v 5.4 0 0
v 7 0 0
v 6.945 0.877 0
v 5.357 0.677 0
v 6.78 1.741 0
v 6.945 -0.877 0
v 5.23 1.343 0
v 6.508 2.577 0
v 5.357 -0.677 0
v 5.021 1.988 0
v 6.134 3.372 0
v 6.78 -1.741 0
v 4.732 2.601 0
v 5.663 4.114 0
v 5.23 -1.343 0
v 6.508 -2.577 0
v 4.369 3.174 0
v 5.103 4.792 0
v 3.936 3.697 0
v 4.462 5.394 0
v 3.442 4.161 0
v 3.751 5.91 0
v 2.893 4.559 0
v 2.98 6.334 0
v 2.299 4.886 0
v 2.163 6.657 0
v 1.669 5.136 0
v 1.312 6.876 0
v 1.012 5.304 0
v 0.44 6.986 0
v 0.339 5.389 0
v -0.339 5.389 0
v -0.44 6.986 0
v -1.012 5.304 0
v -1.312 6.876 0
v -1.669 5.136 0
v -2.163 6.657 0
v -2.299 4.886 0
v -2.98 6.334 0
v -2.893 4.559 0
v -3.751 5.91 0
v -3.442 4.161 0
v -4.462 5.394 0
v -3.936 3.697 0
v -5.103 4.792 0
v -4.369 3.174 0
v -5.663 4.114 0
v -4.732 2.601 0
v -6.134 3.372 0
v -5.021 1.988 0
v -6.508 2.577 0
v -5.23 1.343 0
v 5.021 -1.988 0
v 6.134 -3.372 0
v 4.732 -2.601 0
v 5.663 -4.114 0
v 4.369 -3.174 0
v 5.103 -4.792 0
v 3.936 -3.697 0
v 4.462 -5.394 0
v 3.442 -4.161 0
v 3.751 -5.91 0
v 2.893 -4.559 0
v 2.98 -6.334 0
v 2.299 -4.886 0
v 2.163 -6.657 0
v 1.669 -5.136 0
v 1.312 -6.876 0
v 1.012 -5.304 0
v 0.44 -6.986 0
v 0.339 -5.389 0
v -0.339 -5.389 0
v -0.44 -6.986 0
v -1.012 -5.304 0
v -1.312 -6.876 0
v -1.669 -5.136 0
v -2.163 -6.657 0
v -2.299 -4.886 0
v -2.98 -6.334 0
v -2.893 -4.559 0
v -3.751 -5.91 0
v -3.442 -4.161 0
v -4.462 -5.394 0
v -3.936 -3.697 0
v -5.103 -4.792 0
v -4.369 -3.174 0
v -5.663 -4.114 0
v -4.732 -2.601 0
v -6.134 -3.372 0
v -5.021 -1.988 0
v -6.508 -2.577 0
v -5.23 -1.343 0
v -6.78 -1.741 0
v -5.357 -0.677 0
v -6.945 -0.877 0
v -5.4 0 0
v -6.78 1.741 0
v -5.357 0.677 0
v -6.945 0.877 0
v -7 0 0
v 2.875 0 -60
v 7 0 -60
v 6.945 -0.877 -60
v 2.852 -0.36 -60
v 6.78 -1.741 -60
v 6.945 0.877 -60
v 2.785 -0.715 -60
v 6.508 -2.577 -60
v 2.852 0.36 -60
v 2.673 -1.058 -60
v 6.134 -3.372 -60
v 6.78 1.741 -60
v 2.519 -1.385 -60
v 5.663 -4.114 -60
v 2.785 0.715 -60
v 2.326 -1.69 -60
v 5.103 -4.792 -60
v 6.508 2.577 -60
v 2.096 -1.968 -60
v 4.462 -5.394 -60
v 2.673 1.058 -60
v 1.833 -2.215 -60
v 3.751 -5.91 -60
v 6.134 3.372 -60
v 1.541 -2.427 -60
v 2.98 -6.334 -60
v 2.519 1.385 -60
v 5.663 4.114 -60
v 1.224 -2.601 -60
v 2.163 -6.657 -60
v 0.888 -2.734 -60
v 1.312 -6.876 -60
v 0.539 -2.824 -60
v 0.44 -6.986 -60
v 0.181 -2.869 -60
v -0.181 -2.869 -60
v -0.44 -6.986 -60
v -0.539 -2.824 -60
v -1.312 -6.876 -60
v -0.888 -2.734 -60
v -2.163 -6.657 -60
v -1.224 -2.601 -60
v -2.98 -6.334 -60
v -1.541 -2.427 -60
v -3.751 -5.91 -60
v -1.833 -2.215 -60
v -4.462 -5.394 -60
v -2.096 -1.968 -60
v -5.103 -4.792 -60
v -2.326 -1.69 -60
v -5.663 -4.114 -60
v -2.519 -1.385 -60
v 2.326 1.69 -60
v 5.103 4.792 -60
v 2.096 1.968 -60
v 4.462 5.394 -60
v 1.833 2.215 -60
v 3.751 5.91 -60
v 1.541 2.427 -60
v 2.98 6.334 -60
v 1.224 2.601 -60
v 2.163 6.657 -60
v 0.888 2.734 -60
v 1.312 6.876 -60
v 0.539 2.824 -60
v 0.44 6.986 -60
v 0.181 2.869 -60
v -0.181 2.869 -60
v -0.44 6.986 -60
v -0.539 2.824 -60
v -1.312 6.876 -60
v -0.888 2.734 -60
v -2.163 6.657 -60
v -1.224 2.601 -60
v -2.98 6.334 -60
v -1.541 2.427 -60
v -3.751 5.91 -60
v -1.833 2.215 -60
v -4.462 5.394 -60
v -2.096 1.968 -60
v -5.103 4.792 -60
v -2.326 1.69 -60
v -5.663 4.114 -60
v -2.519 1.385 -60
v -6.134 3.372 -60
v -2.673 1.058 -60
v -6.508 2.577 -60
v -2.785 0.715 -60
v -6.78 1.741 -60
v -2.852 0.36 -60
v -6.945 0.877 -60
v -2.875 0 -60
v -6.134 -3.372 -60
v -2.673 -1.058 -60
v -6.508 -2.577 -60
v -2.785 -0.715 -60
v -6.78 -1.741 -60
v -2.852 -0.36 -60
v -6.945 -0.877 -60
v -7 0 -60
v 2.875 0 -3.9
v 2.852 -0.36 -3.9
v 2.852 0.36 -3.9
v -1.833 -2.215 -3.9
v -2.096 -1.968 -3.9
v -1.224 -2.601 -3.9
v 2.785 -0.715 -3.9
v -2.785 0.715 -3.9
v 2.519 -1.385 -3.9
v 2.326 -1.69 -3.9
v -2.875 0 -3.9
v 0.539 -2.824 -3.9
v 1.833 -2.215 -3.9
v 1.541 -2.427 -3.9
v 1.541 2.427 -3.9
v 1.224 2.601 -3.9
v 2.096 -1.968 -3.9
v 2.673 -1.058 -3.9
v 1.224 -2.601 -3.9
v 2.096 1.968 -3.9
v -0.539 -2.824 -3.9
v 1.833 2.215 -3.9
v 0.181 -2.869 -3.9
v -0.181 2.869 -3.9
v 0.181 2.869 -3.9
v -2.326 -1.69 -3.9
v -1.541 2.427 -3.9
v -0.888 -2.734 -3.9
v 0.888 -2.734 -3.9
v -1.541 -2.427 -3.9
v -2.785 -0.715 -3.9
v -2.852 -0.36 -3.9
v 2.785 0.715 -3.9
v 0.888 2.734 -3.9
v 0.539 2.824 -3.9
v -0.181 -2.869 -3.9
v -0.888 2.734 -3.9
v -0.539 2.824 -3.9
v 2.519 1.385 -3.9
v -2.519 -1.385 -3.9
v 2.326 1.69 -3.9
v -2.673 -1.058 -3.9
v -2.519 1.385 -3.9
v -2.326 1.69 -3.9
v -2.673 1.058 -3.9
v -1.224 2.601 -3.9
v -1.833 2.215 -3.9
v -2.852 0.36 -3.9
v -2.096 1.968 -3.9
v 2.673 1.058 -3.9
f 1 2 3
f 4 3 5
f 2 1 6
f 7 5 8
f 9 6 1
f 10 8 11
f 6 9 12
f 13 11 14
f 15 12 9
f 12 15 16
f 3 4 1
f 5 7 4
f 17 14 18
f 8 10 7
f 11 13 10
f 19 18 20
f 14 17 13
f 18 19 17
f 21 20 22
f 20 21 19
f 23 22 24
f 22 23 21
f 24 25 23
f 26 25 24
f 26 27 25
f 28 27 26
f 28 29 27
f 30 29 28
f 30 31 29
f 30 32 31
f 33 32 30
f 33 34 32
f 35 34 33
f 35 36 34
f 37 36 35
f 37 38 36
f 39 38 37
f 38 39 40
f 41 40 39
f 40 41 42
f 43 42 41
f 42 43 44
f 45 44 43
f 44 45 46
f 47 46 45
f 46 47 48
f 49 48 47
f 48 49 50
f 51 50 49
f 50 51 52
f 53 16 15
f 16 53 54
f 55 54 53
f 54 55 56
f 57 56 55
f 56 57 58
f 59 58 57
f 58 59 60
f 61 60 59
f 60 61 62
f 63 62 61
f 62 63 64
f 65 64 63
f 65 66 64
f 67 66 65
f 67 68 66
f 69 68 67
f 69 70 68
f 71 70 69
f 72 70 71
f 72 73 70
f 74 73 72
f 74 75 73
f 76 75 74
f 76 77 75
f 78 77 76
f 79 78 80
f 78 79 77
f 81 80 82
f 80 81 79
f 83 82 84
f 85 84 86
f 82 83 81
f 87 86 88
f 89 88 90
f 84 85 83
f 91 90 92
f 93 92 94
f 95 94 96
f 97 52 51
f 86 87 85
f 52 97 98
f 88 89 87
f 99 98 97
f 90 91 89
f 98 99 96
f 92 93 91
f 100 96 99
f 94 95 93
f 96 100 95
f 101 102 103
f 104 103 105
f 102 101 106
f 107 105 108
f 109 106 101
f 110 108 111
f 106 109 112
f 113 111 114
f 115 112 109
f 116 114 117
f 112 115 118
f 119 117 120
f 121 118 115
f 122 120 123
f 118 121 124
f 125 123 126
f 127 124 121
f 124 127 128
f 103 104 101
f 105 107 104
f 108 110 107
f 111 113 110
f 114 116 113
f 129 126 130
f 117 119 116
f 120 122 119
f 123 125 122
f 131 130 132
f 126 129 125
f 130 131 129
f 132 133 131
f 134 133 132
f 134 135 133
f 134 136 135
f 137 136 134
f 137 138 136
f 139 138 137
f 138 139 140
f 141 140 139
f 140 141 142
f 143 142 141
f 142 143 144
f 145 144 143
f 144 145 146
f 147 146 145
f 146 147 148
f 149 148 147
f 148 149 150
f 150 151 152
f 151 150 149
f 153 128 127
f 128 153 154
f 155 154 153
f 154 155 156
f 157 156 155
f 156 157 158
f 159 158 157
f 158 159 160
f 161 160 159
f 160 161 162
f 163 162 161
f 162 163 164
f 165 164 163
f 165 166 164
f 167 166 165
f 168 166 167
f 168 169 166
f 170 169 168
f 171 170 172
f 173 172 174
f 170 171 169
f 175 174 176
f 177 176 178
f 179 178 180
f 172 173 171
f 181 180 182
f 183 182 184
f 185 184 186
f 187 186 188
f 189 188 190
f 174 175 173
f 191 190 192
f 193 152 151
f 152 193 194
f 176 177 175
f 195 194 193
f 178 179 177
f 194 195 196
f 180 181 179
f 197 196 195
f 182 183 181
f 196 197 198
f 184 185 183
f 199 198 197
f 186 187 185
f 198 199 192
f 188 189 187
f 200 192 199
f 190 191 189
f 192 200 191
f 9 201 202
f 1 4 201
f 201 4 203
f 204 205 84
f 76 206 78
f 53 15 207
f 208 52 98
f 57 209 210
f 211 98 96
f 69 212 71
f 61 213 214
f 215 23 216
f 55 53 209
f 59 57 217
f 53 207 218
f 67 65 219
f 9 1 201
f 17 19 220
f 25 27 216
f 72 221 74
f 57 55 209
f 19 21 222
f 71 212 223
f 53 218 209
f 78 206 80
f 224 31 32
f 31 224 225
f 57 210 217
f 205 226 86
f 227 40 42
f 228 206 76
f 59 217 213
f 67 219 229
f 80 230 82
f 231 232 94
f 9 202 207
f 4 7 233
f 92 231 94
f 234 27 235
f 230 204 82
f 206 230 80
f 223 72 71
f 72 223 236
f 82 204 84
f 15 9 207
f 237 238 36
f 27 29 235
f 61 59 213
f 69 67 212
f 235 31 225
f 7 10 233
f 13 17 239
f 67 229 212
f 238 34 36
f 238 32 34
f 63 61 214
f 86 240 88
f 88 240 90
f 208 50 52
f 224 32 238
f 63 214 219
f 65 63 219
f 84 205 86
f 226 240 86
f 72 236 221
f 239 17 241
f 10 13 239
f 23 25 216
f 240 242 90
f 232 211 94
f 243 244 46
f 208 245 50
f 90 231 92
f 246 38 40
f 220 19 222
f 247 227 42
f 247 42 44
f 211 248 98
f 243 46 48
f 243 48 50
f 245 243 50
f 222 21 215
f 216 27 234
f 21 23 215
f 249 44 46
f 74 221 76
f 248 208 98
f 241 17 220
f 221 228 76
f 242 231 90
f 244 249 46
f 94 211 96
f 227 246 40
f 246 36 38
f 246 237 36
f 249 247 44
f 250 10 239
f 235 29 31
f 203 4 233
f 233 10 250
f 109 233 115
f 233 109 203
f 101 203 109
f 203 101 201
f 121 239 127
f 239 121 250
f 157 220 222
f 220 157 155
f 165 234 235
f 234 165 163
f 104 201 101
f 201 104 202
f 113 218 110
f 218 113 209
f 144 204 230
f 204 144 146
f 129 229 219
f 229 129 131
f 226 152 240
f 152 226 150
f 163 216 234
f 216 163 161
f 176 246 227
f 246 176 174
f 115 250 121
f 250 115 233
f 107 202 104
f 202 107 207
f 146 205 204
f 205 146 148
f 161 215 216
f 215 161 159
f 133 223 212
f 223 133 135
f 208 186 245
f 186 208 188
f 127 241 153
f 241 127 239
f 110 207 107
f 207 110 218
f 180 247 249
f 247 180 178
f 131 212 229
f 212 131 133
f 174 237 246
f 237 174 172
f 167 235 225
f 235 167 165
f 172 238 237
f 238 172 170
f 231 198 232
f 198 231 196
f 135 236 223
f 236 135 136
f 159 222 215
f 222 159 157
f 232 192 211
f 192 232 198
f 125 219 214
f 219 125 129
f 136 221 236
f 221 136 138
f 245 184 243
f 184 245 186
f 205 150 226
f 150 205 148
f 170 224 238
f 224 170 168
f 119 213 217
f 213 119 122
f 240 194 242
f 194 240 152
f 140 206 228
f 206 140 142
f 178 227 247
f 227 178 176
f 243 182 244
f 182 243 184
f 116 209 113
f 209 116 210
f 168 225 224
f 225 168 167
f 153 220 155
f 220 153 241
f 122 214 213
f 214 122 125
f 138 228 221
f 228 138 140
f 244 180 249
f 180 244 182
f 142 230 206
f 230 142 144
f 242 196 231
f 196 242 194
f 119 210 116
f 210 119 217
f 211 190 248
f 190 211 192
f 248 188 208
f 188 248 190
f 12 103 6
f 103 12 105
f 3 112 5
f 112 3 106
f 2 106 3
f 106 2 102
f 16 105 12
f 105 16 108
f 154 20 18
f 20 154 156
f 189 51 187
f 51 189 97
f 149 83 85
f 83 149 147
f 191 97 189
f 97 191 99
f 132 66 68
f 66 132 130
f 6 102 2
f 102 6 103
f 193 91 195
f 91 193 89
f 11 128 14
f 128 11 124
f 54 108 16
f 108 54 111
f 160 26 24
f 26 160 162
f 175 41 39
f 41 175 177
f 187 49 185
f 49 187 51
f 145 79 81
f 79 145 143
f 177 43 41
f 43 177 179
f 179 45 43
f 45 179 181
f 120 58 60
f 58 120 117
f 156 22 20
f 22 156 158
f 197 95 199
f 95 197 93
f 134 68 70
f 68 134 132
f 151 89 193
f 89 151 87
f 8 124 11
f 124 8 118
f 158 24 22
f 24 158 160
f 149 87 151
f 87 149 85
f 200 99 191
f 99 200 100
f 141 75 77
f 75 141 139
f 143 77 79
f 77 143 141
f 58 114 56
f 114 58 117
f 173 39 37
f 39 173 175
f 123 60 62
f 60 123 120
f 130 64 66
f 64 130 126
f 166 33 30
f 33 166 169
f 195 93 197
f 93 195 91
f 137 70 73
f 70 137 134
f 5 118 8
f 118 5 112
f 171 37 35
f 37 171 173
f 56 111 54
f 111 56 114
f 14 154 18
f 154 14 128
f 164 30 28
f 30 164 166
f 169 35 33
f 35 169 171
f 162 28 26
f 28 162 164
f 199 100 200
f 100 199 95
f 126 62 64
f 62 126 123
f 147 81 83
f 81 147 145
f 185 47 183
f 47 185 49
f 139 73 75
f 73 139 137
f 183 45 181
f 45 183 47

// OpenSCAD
$fn = 50;


difference() {
	union() {
		translate(v = [0, 0, -60.0000000000]) {
			cylinder(h = 60, r = 7.0000000000);
		}
		cylinder(h = 0, r = 13.0000000000);
	}
	union() {
		translate(v = [0, 0, 0]) {
			rotate(a = [0, 0, 0]) {
				difference() {
					union() {
						#translate(v = [0, 0, -60.0000000000]) {
							cylinder(h = 60, r = 2.6000000000);
						}
						#translate(v = [0, 0, -3.9000000000]) {
							cylinder(h = 3.9000000000, r = 7.0000000000, r1 = 2.8750000000, r2 = 5.4000000000);
						}
						#translate(v = [0, 0, -60.0000000000]) {
							cylinder(h = 60, r = 2.8750000000);
						}
						#translate(v = [0, 0, -60.0000000000]) {
							cylinder(h = 60, r = 2.6000000000);
						}
					}
					union();
				}
			}
		}
	}
}
